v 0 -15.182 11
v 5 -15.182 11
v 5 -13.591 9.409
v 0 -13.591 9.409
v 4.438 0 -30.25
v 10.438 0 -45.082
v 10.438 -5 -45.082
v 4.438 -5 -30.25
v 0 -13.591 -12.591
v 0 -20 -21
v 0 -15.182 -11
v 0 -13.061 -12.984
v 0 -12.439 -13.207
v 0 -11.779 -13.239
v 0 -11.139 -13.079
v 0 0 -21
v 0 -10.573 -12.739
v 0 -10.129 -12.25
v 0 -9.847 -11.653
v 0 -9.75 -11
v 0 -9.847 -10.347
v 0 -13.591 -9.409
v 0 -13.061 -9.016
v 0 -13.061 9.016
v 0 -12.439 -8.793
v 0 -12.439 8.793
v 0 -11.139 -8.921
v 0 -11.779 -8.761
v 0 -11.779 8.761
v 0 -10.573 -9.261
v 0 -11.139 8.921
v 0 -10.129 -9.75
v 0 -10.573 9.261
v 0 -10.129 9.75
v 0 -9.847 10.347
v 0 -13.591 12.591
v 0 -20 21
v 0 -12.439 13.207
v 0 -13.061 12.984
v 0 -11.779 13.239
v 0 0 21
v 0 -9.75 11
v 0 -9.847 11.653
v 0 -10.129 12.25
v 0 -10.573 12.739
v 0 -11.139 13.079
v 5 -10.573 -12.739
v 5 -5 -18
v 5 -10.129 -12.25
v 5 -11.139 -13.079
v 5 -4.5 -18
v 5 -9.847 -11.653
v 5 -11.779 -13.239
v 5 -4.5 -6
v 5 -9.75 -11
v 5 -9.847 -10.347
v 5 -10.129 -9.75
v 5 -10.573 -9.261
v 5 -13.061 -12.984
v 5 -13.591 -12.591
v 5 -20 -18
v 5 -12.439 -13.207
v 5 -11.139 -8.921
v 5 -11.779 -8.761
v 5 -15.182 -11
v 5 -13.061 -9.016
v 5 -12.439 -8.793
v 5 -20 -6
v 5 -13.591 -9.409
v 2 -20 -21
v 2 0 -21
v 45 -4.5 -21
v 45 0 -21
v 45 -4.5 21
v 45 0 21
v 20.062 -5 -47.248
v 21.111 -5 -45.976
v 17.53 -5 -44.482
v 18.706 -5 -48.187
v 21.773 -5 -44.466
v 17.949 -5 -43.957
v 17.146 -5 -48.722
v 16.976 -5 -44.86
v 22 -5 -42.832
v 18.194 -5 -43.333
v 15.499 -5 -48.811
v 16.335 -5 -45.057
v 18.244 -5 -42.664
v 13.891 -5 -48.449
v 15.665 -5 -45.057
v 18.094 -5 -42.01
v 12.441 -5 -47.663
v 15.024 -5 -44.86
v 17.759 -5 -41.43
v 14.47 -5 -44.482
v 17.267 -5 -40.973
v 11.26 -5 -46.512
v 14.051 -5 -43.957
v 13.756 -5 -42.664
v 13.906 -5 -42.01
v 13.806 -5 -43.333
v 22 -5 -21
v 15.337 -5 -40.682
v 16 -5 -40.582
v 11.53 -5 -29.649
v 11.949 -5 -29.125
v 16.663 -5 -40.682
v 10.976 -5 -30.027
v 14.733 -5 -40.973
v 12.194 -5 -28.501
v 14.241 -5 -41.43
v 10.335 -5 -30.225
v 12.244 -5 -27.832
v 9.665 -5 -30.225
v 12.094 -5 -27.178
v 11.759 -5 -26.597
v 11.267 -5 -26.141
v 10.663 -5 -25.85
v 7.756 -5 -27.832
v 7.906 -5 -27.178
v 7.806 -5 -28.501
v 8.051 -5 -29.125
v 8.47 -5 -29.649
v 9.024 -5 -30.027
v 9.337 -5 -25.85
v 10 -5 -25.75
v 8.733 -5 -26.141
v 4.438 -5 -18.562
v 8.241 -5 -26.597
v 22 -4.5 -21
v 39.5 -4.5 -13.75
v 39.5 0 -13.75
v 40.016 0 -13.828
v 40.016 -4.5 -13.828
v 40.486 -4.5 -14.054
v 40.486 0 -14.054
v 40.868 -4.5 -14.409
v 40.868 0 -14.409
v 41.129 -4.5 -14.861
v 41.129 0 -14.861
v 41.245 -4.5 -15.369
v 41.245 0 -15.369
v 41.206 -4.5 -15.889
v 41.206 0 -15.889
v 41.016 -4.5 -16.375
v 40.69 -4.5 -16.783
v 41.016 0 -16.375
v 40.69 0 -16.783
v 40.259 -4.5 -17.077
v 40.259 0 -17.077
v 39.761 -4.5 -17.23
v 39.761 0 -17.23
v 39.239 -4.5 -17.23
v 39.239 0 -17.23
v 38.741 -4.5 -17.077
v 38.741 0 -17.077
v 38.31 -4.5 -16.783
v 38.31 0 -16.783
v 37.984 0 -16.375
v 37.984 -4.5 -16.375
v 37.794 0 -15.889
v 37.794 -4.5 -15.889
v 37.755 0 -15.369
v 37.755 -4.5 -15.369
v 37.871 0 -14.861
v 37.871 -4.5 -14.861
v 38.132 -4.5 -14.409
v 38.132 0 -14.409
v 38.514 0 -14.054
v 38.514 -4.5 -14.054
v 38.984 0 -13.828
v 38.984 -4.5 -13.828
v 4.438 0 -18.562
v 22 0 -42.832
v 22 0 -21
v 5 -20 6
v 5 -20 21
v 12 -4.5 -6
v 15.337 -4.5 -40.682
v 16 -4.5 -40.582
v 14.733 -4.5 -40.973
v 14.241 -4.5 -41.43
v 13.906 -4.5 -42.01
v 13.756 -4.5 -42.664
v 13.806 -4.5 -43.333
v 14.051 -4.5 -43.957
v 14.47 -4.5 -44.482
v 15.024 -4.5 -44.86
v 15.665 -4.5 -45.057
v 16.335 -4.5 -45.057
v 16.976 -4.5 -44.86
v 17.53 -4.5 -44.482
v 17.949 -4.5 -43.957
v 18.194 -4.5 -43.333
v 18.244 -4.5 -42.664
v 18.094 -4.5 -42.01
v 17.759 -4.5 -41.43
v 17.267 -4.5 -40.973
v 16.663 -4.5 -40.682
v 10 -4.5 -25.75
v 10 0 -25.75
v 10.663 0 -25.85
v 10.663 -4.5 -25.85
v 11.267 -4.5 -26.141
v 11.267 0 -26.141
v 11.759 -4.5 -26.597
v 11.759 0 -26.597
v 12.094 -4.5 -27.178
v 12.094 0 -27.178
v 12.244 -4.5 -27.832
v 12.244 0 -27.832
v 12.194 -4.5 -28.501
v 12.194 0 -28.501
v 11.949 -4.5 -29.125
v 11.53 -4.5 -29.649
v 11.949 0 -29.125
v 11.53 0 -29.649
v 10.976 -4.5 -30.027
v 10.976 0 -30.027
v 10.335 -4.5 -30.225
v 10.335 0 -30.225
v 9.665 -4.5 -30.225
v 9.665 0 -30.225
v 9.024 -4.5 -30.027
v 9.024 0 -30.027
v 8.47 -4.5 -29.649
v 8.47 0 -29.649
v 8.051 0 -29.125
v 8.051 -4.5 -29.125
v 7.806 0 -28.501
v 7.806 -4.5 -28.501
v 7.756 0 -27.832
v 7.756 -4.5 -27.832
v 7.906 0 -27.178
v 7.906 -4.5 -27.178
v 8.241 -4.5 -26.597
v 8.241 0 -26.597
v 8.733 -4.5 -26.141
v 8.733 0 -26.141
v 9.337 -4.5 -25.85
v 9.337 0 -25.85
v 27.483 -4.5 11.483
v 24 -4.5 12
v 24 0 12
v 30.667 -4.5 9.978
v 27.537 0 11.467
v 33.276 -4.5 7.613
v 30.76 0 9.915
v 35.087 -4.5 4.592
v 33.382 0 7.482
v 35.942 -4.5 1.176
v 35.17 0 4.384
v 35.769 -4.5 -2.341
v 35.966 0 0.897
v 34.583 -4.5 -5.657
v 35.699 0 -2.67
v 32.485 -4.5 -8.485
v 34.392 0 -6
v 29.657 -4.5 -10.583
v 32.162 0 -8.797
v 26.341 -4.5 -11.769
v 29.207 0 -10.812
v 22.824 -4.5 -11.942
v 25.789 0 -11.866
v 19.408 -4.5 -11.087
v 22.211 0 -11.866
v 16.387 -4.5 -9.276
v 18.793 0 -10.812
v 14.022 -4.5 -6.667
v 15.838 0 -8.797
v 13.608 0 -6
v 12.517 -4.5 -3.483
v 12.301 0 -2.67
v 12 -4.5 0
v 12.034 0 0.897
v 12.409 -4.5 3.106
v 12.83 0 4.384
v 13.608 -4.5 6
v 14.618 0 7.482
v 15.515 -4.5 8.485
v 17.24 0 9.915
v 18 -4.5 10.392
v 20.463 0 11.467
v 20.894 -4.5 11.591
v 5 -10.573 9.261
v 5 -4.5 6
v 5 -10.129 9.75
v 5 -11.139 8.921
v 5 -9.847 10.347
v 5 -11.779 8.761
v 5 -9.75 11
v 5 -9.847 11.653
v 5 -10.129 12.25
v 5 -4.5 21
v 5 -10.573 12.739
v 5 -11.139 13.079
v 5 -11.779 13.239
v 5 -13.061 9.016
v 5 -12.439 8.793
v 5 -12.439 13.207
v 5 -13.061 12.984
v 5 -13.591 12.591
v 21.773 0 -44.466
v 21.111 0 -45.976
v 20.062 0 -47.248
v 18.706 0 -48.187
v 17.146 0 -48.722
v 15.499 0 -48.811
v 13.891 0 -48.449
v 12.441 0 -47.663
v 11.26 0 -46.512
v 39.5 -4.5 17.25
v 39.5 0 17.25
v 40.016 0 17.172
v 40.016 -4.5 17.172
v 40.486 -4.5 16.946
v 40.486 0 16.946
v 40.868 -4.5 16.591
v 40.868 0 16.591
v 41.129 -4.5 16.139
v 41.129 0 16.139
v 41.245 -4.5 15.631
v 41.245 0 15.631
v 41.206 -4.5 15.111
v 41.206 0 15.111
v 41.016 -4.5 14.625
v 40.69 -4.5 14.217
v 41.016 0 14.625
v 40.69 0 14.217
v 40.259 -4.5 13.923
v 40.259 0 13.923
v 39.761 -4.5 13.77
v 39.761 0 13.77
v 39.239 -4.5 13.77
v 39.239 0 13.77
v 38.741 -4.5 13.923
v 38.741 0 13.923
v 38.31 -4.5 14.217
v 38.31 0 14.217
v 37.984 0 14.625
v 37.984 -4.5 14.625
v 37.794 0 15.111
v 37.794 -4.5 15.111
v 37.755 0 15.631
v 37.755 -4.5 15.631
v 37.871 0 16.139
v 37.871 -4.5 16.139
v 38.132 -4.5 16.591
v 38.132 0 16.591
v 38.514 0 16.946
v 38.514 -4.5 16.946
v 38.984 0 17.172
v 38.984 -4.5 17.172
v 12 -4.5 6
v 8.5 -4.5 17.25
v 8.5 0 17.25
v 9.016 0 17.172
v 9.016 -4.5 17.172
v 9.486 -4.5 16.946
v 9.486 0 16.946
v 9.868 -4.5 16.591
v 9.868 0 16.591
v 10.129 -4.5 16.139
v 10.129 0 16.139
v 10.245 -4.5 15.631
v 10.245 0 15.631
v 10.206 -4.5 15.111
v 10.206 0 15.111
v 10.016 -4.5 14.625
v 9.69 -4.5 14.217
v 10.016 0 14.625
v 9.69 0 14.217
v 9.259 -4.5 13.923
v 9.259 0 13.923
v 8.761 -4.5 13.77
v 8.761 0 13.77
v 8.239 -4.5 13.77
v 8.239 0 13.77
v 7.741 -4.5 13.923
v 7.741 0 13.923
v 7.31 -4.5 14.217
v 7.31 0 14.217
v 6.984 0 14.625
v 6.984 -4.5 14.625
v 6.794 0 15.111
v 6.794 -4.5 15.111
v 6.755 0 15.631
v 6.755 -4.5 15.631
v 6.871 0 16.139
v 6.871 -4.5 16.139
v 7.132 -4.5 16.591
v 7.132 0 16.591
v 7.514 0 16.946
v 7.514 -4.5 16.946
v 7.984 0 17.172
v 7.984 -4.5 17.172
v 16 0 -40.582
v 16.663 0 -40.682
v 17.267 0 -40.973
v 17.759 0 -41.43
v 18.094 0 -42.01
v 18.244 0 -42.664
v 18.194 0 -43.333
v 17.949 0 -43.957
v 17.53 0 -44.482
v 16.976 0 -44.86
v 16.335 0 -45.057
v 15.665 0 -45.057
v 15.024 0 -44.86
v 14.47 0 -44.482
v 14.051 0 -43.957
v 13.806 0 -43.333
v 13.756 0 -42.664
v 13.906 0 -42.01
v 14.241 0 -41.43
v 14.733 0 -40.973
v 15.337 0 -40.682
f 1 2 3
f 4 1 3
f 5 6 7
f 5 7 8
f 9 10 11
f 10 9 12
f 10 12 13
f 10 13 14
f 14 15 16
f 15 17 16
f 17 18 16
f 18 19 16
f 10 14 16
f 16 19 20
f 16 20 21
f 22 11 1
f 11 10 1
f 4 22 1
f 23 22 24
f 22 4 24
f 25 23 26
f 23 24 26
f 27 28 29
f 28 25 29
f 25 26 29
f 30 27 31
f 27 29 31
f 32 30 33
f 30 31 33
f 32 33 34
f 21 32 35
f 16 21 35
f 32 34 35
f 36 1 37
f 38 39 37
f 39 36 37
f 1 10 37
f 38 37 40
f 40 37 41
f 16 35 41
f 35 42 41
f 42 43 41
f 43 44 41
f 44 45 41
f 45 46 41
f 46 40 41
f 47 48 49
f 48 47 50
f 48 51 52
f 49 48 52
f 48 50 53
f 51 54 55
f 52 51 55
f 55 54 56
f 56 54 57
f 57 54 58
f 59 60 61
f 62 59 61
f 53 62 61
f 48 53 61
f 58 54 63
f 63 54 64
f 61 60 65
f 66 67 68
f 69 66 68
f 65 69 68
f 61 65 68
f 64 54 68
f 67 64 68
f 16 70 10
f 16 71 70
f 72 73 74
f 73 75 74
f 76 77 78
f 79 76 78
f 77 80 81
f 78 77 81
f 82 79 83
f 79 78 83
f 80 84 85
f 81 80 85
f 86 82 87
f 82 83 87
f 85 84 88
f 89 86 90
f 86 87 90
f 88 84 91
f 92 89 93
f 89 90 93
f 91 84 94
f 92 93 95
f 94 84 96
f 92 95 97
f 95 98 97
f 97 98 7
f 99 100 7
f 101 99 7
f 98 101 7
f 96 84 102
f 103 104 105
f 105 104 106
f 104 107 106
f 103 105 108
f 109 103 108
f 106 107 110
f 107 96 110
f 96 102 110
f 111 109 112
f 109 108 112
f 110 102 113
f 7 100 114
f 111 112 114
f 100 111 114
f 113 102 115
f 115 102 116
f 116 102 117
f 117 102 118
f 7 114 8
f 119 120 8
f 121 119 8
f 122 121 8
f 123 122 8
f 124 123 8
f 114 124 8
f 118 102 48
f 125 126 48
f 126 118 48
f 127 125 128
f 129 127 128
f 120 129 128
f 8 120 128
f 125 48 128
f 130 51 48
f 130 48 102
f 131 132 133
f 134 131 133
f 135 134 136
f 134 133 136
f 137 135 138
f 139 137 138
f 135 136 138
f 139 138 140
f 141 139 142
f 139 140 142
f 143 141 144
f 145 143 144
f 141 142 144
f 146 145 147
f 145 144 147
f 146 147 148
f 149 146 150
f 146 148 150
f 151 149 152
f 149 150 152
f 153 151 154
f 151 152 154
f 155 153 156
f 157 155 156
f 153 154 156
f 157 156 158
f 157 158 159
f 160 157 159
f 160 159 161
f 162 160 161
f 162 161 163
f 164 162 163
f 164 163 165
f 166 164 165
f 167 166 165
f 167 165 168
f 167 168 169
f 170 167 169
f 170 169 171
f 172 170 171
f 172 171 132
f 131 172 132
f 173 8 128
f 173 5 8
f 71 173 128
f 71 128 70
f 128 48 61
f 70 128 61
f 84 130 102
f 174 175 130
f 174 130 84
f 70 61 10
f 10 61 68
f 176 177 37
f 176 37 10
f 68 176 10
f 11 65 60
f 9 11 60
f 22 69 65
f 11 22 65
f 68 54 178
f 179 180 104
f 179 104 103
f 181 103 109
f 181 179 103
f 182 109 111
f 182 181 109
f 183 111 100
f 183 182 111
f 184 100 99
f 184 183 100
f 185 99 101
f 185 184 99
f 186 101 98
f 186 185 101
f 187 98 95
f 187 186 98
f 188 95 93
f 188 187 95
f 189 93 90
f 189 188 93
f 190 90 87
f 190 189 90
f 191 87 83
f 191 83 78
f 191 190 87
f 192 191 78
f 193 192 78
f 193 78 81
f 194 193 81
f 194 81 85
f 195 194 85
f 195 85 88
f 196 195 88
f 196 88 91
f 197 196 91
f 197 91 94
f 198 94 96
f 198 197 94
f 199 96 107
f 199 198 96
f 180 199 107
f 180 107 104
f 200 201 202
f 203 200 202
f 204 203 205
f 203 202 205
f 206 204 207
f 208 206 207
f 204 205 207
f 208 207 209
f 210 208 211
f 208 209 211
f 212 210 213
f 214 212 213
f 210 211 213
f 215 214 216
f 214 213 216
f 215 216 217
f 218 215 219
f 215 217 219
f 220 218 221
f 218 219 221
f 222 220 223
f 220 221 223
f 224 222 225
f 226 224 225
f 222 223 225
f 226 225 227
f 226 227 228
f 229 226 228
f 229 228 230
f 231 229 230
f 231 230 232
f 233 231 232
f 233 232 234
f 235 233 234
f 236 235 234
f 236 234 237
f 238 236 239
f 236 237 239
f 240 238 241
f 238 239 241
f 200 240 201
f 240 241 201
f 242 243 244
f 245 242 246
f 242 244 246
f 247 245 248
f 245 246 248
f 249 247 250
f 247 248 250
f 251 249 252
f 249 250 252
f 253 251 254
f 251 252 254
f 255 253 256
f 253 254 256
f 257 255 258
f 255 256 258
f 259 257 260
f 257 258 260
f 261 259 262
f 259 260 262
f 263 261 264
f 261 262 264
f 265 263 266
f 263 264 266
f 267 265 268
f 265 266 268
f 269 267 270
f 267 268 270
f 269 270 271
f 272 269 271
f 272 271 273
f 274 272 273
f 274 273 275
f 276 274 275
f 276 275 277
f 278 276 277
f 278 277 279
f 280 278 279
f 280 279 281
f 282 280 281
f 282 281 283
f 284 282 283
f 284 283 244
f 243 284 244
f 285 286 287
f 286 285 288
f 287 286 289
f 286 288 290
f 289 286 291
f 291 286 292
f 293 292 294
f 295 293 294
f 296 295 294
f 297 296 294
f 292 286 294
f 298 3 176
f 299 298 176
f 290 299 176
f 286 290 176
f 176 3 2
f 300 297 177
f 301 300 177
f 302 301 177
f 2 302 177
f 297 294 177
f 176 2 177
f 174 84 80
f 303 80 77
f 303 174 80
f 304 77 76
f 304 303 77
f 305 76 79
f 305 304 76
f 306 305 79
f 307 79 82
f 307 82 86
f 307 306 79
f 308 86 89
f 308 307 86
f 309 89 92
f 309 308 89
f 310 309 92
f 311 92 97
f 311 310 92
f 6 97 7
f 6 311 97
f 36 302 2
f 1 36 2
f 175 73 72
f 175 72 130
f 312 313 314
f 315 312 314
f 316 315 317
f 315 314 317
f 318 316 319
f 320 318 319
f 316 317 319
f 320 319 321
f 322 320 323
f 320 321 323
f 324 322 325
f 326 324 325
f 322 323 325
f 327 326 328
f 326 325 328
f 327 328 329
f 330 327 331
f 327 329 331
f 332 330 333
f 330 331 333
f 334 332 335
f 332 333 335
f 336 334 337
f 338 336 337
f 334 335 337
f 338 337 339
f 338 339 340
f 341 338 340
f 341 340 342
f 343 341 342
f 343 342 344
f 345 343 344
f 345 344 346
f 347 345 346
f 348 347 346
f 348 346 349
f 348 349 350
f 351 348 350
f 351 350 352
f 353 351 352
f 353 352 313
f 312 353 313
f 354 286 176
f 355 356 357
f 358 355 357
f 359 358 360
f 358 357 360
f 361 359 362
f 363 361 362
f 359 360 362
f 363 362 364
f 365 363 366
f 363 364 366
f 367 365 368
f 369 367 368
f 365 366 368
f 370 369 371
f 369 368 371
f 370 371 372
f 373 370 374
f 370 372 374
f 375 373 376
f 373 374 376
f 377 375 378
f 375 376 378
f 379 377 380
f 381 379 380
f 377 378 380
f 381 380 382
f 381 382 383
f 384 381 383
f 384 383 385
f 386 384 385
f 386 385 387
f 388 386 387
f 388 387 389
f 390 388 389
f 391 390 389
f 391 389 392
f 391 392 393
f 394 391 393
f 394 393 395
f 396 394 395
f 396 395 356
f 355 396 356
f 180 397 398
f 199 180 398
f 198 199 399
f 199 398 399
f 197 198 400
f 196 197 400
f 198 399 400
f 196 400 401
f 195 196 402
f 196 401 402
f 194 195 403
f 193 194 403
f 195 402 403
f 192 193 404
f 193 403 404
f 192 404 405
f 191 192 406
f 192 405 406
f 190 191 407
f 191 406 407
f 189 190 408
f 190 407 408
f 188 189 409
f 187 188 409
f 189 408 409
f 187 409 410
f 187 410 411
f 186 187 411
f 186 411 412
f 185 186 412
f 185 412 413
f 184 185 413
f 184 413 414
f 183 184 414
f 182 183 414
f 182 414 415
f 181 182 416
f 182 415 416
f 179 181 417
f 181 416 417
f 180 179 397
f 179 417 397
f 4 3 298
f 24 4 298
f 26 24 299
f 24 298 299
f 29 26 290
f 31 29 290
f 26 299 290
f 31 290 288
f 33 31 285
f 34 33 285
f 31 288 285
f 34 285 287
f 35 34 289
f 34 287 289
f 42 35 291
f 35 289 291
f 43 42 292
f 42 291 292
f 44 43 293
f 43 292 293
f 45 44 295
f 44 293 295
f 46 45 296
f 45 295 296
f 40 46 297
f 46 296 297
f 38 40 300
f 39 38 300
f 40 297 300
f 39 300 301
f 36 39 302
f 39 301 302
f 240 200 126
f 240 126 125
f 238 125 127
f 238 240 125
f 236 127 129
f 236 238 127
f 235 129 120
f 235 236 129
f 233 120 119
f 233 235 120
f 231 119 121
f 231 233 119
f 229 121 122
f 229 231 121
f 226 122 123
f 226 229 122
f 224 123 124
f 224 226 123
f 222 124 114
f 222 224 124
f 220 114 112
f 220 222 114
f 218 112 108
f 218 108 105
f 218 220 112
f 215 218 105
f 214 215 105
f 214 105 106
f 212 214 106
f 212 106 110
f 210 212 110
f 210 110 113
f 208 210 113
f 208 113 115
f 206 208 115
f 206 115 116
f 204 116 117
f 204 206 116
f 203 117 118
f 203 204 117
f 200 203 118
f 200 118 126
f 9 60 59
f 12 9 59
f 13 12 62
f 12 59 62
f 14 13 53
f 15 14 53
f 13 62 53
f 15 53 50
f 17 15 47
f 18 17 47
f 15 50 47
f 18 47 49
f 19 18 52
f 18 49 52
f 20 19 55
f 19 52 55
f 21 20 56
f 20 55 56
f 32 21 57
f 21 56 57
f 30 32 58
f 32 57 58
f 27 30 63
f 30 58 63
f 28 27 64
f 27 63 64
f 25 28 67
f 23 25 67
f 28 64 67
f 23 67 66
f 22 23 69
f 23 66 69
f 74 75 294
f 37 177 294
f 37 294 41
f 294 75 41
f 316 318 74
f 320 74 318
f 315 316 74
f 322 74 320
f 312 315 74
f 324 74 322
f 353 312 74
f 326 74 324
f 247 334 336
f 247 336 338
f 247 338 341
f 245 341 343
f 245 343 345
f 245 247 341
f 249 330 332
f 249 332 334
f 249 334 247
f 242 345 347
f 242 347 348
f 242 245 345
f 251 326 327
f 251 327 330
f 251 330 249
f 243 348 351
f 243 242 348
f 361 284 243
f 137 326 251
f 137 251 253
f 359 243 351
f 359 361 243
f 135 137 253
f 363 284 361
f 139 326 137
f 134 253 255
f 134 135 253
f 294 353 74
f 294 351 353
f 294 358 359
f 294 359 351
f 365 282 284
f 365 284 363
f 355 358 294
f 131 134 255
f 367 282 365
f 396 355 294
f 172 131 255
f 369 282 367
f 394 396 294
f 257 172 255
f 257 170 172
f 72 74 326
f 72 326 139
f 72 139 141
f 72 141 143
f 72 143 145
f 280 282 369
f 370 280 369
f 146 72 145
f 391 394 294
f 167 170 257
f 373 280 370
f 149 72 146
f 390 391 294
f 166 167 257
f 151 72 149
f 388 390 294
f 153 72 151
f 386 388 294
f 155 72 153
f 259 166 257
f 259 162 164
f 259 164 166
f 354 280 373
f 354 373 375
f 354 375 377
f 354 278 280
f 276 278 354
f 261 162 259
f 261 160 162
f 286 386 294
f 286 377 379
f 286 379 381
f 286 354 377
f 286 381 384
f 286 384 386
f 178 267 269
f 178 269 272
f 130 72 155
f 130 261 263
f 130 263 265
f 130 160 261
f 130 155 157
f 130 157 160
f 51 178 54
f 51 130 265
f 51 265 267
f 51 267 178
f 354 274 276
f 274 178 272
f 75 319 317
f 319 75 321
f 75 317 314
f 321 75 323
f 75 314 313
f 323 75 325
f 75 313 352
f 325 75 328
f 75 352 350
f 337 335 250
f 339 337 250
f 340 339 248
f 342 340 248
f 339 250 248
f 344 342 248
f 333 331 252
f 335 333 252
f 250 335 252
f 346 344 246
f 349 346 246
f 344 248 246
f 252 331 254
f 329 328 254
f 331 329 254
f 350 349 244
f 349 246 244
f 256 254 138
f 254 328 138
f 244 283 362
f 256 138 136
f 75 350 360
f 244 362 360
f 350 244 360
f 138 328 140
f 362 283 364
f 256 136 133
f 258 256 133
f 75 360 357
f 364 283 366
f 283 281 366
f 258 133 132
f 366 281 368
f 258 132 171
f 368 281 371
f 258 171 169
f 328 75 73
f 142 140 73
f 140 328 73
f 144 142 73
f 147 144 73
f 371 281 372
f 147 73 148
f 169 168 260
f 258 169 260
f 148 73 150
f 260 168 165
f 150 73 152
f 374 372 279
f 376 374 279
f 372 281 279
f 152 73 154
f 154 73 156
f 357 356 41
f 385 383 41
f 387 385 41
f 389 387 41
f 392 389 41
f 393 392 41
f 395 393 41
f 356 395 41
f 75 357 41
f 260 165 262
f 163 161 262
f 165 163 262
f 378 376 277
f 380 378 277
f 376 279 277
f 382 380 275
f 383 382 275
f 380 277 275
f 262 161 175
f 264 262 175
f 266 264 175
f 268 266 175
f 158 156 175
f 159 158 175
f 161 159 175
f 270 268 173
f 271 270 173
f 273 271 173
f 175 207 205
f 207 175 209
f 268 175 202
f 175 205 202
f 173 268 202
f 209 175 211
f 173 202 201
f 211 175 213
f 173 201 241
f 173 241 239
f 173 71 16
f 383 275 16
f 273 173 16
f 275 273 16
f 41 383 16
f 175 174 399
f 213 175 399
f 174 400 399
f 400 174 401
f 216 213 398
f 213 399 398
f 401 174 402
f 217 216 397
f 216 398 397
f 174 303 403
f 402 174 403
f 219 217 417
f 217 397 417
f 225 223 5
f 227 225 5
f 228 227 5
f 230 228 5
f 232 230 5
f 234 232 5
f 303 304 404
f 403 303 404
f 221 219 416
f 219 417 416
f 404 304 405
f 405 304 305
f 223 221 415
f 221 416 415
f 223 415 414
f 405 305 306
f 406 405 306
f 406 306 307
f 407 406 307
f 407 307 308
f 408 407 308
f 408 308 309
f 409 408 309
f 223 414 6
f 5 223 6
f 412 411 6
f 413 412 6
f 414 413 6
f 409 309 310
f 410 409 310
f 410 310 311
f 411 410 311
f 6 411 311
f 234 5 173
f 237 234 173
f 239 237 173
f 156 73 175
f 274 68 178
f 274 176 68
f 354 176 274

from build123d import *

# Parameters (mm, degrees)
BOSS_EXTRUDE1_DEPTH = 21
CUT_EXTRUDE1_REACH  = 55.535
SKETCH2_R           = 12
SKETCH2_R_2         = 1.75
BOSS_EXTRUDE2_DEPTH = 6
CUT_EXTRUDE2_DEPTH  = 50.406477308
SKETCH5_R           = 2.25
BOSS_EXTRUDE3_DEPTH = 4.5
CHAMFER1_SIZE       = 3
SKETCH6_R           = 2.25
BOSS_EXTRUDE4_DEPTH = 0.5


with BuildPart() as part:
    # Sketch1 → Boss-Extrude1 (new, symmetric)
    with BuildSketch(Plane.XY):
        Polygon((0, 0), (45, 0), (45, -4.5), (5, -4.5), (5, -20), (0, -20), align=None)
    extrude(amount=BOSS_EXTRUDE1_DEPTH, both=True)

    # Sketch2 → Cut-Extrude1 (cut, up to next)
    with BuildSketch(Plane(origin=(0, 0, 0), x_dir=(1, 0, 0), z_dir=(0, 1, 0)), mode=Mode.PRIVATE) as cut_extrude1_sk1:
        with Locations(Location((24, 0, 0), (0, 0, 270))):
            Circle(SKETCH2_R)
    cut_extrude1_tool1 = extrude(cut_extrude1_sk1.sketch, amount=-CUT_EXTRUDE1_REACH, mode=Mode.PRIVATE) & part.part
    # Sketch2 → Cut-Extrude1 (cut, up to next)
    with BuildSketch(Plane(origin=(0, 0, 0), x_dir=(1, 0, 0), z_dir=(0, 1, 0)), mode=Mode.PRIVATE) as cut_extrude1_sk2:
        with Locations(Location((39.5, 15.5, 0), (0, 0, 270))):
            Circle(SKETCH2_R_2)
    cut_extrude1_tool2 = extrude(cut_extrude1_sk2.sketch, amount=-CUT_EXTRUDE1_REACH, mode=Mode.PRIVATE) & part.part
    # Sketch2 → Cut-Extrude1 (cut, up to next)
    with BuildSketch(Plane(origin=(0, 0, 0), x_dir=(1, 0, 0), z_dir=(0, 1, 0)), mode=Mode.PRIVATE) as cut_extrude1_sk3:
        with Locations(Location((8.5, -15.5, 0), (0, 0, 270))):
            Circle(SKETCH2_R_2)
    cut_extrude1_tool3 = extrude(cut_extrude1_sk3.sketch, amount=-CUT_EXTRUDE1_REACH, mode=Mode.PRIVATE) & part.part
    # Sketch2 → Cut-Extrude1 (cut, up to next)
    with BuildSketch(Plane(origin=(0, 0, 0), x_dir=(1, 0, 0), z_dir=(0, 1, 0)), mode=Mode.PRIVATE) as cut_extrude1_sk4:
        with Locations(Location((39.5, -15.5, 0), (0, 0, 270))):
            Circle(SKETCH2_R_2)
    cut_extrude1_tool4 = extrude(cut_extrude1_sk4.sketch, amount=-CUT_EXTRUDE1_REACH, mode=Mode.PRIVATE) & part.part
    add(cut_extrude1_tool1.solids().sort_by_distance((24, 0, 0))[0], mode=Mode.SUBTRACT)
    add(cut_extrude1_tool2.solids().sort_by_distance((39.5, 0, -15.5))[0], mode=Mode.SUBTRACT)
    add(cut_extrude1_tool3.solids().sort_by_distance((8.5, 0, 15.5))[0], mode=Mode.SUBTRACT)
    add(cut_extrude1_tool4.solids().sort_by_distance((39.5, 0, 15.5))[0], mode=Mode.SUBTRACT)

    # Sketch3 → Boss-Extrude2 (add, symmetric)
    with BuildSketch(Plane.XY):
        Polygon((5, -20), (12, -4.5), (5, -4.5), align=None)
    extrude(amount=BOSS_EXTRUDE2_DEPTH, both=True)

    # Sketch4 → Cut-Extrude2 (cut, through all)
    with BuildSketch(Plane(origin=(5, 0, 0), x_dir=(0, 0, -1), z_dir=(1, 0, 0))):
        with BuildLine():
            Line((9.409009742, -13.590990258), (11, -15.181980515))
            Line((11, -15.181980515), (12.590990258, -13.590990258))
            ThreePointArc((12.590990258, -13.590990258), (11, -9.75), (9.409009742, -13.590990258))
        make_face()
        with BuildLine():
            Line((-12.590990258, -13.590990258), (-11, -15.181980515))
            Line((-11, -15.181980515), (-9.409009742, -13.590990258))
            ThreePointArc((-9.409009742, -13.590990258), (-11, -9.75), (-12.590990258, -13.590990258))
        make_face()
    extrude(amount=-CUT_EXTRUDE2_DEPTH, mode=Mode.SUBTRACT)

    # Sketch5 → Boss-Extrude3 (add)
    with BuildSketch(Plane(origin=(0, 0, 0), x_dir=(1, 0, 0), z_dir=(0, 1, 0))):
        with BuildLine():
            Line((4.437851135, 30.25), (10.437851135, 45.082396974))
            ThreePointArc((10.437851135, 45.082396974), (17.146103575, 48.721917039), (22, 42.832396974))
            Line((22, 42.832396974), (22, 21))
            Line((22, 21), (4.437851135, 21))
            Line((4.437851135, 21), (4.437851135, 30.25))
        make_face()
        with Locations(Location((10, 28, 0), (0, 0, 270))):
            Circle(SKETCH5_R, mode=Mode.SUBTRACT)
        with Locations(Location((16, 42.832396974, 0), (0, 0, 270))):
            Circle(SKETCH5_R, mode=Mode.SUBTRACT)
    extrude(amount=-BOSS_EXTRUDE3_DEPTH)

    # Chamfer1
    chamfer1_edges = [part.edges().sort_by_distance(p)[0] for p in [
        (5, -12.25, -21),
    ]]
    chamfer(chamfer1_edges, length=CHAMFER1_SIZE)

    # Sketch6 → Boss-Extrude4 (add)
    with BuildSketch(Plane.XZ.offset(4.5)):
        with BuildLine():
            Line((5, -18), (22, -21))
            Line((22, -21), (22, -42.832396974))
            ThreePointArc((22, -42.832396974), (17.146103575, -48.721917039), (10.437851135, -45.082396974))
            Line((10.437851135, -45.082396974), (4.437851135, -30.25))
            Line((4.437851135, -30.25), (4.437851135, -18.562148865))
            Line((4.437851135, -18.562148865), (5, -18))
        make_face()
        with Locations(Location((10, -28, 0), (0, 0, 90))):
            Circle(SKETCH6_R, mode=Mode.SUBTRACT)
        with Locations(Location((16, -42.832396974, 0), (0, 0, 90))):
            Circle(SKETCH6_R, mode=Mode.SUBTRACT)
    extrude(amount=BOSS_EXTRUDE4_DEPTH)


solid = part.part
